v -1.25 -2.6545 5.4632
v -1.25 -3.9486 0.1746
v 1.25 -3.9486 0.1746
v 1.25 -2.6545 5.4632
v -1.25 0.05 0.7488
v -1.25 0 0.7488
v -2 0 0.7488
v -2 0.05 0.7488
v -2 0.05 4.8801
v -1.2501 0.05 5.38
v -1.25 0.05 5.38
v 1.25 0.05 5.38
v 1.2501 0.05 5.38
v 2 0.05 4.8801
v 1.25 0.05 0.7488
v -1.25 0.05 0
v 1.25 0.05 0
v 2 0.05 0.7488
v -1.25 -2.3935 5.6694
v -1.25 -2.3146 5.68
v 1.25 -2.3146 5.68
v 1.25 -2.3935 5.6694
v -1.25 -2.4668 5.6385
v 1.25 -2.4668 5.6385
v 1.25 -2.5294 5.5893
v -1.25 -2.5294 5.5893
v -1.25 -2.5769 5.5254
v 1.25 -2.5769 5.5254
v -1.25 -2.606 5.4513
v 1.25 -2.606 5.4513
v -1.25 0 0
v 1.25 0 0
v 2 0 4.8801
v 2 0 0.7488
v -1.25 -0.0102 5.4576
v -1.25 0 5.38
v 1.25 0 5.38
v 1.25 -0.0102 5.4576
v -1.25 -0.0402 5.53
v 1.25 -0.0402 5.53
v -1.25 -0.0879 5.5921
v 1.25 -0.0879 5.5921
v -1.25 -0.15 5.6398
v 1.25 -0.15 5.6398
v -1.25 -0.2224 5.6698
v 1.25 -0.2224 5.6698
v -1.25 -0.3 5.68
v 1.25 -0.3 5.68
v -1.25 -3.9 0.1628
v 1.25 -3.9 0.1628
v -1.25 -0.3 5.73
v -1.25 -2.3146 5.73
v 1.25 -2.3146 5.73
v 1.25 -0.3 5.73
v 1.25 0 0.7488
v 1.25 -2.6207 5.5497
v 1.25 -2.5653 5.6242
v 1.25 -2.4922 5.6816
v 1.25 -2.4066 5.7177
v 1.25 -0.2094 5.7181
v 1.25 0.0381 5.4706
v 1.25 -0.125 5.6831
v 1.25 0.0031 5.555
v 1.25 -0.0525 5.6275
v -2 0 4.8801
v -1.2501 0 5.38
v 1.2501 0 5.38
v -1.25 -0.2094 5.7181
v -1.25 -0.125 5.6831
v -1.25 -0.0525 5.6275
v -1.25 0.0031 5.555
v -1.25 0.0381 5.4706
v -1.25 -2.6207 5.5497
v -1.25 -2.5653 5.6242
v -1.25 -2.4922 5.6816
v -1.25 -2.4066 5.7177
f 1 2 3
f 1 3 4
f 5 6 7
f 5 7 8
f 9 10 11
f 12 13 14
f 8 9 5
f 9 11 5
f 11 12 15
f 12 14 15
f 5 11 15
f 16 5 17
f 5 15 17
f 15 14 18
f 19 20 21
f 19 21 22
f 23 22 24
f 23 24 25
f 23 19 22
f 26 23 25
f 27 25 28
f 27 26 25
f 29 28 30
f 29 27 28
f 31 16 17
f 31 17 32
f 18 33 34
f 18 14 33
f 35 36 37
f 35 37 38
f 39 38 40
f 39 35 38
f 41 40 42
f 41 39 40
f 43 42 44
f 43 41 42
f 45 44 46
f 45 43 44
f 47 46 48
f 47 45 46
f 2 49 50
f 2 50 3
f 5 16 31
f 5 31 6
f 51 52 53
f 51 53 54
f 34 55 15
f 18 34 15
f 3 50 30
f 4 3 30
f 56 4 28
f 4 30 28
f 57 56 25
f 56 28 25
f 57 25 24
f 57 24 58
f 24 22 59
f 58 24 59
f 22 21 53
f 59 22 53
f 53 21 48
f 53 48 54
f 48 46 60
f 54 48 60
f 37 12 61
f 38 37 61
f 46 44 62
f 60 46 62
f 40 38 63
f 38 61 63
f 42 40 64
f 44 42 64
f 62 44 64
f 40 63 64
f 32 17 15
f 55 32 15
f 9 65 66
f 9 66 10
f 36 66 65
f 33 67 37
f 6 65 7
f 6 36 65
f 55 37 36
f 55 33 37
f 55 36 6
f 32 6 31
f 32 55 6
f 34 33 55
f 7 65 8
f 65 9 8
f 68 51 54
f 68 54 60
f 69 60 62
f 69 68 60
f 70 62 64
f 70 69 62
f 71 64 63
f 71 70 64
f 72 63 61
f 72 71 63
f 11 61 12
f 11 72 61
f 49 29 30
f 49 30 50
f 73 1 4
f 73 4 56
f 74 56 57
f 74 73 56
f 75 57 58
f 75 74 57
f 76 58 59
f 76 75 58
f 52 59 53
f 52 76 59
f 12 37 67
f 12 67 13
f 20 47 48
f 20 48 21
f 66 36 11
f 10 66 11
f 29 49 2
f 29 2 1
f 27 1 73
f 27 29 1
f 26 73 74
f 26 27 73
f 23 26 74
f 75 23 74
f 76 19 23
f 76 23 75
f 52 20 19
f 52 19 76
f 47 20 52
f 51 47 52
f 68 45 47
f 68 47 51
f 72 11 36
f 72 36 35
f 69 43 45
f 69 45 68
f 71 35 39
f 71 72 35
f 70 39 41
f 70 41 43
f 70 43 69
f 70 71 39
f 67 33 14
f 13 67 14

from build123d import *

# Parameters (mm, degrees)
EXTRUDE_1_DEPTH      = 1.25
EXTRUDE_1_DEPTH_BACK = 1.25
SKETCH_2_W           = 4.631165465
SKETCH_2_H           = 0.05
EXTRUDE_1_2_DEPTH    = 0.75
CHAMFER_1_SIZE2      = 0.5
CHAMFER_1_SIZE       = 0.75
CHAMFER_2_SIZE2      = 0.5
CHAMFER_2_SIZE       = 0.75


with BuildPart() as part:
    # Эскиз1 → Extrude 1 (new, two sides: drawn at the far end of the back side and taken through both)
    with BuildSketch(Plane(origin=(0, 0, 0), x_dir=(0, 0, -1), z_dir=(1, 0, 0)).offset(-EXTRUDE_1_DEPTH_BACK)):
        with BuildLine():
            Line((0, 0), (-5.38, 0))
            ThreePointArc((-5.38, 0), (-5.592132034, -0.087867966), (-5.68, -0.3))
            Line((-5.68, -0.3), (-5.68, -2.314556047))
            ThreePointArc((-5.68, -2.314556047), (-5.615998777, -2.499770997), (-5.451302817, -2.60595939))
            Line((-5.451302817, -2.60595939), (-0.162763373, -3.9))
            Line((-0.162763373, -3.9), (-0.174647176, -3.948567224))
            Line((-0.174647176, -3.948567224), (-5.46318662, -2.654526614))
            ThreePointArc((-5.46318662, -2.654526614), (-5.655331906, -2.530640155), (-5.73, -2.314556047))
            Line((-5.73, -2.314556047), (-5.73, -0.3))
            ThreePointArc((-5.73, -0.3), (-5.627487373, -0.052512627), (-5.38, 0.05))
            Line((-5.38, 0.05), (0, 0.05))
            Line((0, 0.05), (0, 0))
        make_face()
    extrude(amount=EXTRUDE_1_DEPTH + EXTRUDE_1_DEPTH_BACK)

    # Эскиз2 → Extrude 1 2 (add)
    with BuildSketch(Plane(origin=(1.25, 0, 0), x_dir=(0, 0, -1), z_dir=(1, 0, 0))):
        with Locations((-3.064417268, 0.025)):
            Rectangle(SKETCH_2_W, SKETCH_2_H)
    extrude_1_2 = extrude(amount=EXTRUDE_1_2_DEPTH)

    # Фаска1
    chamfer_1_edges = [part.edges().sort_by_distance(p)[0] for p in [
        (2, 0.025, 5.38),
    ]]
    chamfer_1_side = [part.faces().sort_by_distance(p)[0] for p in [
        (1.99, 0.025, 5.38),
    ]]
    chamfer(chamfer_1_edges, length=CHAMFER_1_SIZE - 0.0001, length2=CHAMFER_1_SIZE2 - 0.0001, reference=chamfer_1_side[0])  # a hair under: the kernel refuses the full size

    # Зеркальное отражение1: Extrude 1 2 across plane
    add(extrude_1_2.mirror(Plane(origin=(0, 0, 0), x_dir=(0, 0, 1), z_dir=(1, 0, 0))))

    # Фаска2
    chamfer_2_edges = [part.edges().sort_by_distance(p)[0] for p in [
        (-2, 0.025, 5.38),
    ]]
    chamfer_2_side = [part.faces().sort_by_distance(p)[0] for p in [
        (-1.99, 0.025, 5.38),
    ]]
    chamfer(chamfer_2_edges, length=CHAMFER_2_SIZE - 0.0001, length2=CHAMFER_2_SIZE2 - 0.0001, reference=chamfer_2_side[0])  # a hair under: the kernel refuses the full size


solid = part.part
